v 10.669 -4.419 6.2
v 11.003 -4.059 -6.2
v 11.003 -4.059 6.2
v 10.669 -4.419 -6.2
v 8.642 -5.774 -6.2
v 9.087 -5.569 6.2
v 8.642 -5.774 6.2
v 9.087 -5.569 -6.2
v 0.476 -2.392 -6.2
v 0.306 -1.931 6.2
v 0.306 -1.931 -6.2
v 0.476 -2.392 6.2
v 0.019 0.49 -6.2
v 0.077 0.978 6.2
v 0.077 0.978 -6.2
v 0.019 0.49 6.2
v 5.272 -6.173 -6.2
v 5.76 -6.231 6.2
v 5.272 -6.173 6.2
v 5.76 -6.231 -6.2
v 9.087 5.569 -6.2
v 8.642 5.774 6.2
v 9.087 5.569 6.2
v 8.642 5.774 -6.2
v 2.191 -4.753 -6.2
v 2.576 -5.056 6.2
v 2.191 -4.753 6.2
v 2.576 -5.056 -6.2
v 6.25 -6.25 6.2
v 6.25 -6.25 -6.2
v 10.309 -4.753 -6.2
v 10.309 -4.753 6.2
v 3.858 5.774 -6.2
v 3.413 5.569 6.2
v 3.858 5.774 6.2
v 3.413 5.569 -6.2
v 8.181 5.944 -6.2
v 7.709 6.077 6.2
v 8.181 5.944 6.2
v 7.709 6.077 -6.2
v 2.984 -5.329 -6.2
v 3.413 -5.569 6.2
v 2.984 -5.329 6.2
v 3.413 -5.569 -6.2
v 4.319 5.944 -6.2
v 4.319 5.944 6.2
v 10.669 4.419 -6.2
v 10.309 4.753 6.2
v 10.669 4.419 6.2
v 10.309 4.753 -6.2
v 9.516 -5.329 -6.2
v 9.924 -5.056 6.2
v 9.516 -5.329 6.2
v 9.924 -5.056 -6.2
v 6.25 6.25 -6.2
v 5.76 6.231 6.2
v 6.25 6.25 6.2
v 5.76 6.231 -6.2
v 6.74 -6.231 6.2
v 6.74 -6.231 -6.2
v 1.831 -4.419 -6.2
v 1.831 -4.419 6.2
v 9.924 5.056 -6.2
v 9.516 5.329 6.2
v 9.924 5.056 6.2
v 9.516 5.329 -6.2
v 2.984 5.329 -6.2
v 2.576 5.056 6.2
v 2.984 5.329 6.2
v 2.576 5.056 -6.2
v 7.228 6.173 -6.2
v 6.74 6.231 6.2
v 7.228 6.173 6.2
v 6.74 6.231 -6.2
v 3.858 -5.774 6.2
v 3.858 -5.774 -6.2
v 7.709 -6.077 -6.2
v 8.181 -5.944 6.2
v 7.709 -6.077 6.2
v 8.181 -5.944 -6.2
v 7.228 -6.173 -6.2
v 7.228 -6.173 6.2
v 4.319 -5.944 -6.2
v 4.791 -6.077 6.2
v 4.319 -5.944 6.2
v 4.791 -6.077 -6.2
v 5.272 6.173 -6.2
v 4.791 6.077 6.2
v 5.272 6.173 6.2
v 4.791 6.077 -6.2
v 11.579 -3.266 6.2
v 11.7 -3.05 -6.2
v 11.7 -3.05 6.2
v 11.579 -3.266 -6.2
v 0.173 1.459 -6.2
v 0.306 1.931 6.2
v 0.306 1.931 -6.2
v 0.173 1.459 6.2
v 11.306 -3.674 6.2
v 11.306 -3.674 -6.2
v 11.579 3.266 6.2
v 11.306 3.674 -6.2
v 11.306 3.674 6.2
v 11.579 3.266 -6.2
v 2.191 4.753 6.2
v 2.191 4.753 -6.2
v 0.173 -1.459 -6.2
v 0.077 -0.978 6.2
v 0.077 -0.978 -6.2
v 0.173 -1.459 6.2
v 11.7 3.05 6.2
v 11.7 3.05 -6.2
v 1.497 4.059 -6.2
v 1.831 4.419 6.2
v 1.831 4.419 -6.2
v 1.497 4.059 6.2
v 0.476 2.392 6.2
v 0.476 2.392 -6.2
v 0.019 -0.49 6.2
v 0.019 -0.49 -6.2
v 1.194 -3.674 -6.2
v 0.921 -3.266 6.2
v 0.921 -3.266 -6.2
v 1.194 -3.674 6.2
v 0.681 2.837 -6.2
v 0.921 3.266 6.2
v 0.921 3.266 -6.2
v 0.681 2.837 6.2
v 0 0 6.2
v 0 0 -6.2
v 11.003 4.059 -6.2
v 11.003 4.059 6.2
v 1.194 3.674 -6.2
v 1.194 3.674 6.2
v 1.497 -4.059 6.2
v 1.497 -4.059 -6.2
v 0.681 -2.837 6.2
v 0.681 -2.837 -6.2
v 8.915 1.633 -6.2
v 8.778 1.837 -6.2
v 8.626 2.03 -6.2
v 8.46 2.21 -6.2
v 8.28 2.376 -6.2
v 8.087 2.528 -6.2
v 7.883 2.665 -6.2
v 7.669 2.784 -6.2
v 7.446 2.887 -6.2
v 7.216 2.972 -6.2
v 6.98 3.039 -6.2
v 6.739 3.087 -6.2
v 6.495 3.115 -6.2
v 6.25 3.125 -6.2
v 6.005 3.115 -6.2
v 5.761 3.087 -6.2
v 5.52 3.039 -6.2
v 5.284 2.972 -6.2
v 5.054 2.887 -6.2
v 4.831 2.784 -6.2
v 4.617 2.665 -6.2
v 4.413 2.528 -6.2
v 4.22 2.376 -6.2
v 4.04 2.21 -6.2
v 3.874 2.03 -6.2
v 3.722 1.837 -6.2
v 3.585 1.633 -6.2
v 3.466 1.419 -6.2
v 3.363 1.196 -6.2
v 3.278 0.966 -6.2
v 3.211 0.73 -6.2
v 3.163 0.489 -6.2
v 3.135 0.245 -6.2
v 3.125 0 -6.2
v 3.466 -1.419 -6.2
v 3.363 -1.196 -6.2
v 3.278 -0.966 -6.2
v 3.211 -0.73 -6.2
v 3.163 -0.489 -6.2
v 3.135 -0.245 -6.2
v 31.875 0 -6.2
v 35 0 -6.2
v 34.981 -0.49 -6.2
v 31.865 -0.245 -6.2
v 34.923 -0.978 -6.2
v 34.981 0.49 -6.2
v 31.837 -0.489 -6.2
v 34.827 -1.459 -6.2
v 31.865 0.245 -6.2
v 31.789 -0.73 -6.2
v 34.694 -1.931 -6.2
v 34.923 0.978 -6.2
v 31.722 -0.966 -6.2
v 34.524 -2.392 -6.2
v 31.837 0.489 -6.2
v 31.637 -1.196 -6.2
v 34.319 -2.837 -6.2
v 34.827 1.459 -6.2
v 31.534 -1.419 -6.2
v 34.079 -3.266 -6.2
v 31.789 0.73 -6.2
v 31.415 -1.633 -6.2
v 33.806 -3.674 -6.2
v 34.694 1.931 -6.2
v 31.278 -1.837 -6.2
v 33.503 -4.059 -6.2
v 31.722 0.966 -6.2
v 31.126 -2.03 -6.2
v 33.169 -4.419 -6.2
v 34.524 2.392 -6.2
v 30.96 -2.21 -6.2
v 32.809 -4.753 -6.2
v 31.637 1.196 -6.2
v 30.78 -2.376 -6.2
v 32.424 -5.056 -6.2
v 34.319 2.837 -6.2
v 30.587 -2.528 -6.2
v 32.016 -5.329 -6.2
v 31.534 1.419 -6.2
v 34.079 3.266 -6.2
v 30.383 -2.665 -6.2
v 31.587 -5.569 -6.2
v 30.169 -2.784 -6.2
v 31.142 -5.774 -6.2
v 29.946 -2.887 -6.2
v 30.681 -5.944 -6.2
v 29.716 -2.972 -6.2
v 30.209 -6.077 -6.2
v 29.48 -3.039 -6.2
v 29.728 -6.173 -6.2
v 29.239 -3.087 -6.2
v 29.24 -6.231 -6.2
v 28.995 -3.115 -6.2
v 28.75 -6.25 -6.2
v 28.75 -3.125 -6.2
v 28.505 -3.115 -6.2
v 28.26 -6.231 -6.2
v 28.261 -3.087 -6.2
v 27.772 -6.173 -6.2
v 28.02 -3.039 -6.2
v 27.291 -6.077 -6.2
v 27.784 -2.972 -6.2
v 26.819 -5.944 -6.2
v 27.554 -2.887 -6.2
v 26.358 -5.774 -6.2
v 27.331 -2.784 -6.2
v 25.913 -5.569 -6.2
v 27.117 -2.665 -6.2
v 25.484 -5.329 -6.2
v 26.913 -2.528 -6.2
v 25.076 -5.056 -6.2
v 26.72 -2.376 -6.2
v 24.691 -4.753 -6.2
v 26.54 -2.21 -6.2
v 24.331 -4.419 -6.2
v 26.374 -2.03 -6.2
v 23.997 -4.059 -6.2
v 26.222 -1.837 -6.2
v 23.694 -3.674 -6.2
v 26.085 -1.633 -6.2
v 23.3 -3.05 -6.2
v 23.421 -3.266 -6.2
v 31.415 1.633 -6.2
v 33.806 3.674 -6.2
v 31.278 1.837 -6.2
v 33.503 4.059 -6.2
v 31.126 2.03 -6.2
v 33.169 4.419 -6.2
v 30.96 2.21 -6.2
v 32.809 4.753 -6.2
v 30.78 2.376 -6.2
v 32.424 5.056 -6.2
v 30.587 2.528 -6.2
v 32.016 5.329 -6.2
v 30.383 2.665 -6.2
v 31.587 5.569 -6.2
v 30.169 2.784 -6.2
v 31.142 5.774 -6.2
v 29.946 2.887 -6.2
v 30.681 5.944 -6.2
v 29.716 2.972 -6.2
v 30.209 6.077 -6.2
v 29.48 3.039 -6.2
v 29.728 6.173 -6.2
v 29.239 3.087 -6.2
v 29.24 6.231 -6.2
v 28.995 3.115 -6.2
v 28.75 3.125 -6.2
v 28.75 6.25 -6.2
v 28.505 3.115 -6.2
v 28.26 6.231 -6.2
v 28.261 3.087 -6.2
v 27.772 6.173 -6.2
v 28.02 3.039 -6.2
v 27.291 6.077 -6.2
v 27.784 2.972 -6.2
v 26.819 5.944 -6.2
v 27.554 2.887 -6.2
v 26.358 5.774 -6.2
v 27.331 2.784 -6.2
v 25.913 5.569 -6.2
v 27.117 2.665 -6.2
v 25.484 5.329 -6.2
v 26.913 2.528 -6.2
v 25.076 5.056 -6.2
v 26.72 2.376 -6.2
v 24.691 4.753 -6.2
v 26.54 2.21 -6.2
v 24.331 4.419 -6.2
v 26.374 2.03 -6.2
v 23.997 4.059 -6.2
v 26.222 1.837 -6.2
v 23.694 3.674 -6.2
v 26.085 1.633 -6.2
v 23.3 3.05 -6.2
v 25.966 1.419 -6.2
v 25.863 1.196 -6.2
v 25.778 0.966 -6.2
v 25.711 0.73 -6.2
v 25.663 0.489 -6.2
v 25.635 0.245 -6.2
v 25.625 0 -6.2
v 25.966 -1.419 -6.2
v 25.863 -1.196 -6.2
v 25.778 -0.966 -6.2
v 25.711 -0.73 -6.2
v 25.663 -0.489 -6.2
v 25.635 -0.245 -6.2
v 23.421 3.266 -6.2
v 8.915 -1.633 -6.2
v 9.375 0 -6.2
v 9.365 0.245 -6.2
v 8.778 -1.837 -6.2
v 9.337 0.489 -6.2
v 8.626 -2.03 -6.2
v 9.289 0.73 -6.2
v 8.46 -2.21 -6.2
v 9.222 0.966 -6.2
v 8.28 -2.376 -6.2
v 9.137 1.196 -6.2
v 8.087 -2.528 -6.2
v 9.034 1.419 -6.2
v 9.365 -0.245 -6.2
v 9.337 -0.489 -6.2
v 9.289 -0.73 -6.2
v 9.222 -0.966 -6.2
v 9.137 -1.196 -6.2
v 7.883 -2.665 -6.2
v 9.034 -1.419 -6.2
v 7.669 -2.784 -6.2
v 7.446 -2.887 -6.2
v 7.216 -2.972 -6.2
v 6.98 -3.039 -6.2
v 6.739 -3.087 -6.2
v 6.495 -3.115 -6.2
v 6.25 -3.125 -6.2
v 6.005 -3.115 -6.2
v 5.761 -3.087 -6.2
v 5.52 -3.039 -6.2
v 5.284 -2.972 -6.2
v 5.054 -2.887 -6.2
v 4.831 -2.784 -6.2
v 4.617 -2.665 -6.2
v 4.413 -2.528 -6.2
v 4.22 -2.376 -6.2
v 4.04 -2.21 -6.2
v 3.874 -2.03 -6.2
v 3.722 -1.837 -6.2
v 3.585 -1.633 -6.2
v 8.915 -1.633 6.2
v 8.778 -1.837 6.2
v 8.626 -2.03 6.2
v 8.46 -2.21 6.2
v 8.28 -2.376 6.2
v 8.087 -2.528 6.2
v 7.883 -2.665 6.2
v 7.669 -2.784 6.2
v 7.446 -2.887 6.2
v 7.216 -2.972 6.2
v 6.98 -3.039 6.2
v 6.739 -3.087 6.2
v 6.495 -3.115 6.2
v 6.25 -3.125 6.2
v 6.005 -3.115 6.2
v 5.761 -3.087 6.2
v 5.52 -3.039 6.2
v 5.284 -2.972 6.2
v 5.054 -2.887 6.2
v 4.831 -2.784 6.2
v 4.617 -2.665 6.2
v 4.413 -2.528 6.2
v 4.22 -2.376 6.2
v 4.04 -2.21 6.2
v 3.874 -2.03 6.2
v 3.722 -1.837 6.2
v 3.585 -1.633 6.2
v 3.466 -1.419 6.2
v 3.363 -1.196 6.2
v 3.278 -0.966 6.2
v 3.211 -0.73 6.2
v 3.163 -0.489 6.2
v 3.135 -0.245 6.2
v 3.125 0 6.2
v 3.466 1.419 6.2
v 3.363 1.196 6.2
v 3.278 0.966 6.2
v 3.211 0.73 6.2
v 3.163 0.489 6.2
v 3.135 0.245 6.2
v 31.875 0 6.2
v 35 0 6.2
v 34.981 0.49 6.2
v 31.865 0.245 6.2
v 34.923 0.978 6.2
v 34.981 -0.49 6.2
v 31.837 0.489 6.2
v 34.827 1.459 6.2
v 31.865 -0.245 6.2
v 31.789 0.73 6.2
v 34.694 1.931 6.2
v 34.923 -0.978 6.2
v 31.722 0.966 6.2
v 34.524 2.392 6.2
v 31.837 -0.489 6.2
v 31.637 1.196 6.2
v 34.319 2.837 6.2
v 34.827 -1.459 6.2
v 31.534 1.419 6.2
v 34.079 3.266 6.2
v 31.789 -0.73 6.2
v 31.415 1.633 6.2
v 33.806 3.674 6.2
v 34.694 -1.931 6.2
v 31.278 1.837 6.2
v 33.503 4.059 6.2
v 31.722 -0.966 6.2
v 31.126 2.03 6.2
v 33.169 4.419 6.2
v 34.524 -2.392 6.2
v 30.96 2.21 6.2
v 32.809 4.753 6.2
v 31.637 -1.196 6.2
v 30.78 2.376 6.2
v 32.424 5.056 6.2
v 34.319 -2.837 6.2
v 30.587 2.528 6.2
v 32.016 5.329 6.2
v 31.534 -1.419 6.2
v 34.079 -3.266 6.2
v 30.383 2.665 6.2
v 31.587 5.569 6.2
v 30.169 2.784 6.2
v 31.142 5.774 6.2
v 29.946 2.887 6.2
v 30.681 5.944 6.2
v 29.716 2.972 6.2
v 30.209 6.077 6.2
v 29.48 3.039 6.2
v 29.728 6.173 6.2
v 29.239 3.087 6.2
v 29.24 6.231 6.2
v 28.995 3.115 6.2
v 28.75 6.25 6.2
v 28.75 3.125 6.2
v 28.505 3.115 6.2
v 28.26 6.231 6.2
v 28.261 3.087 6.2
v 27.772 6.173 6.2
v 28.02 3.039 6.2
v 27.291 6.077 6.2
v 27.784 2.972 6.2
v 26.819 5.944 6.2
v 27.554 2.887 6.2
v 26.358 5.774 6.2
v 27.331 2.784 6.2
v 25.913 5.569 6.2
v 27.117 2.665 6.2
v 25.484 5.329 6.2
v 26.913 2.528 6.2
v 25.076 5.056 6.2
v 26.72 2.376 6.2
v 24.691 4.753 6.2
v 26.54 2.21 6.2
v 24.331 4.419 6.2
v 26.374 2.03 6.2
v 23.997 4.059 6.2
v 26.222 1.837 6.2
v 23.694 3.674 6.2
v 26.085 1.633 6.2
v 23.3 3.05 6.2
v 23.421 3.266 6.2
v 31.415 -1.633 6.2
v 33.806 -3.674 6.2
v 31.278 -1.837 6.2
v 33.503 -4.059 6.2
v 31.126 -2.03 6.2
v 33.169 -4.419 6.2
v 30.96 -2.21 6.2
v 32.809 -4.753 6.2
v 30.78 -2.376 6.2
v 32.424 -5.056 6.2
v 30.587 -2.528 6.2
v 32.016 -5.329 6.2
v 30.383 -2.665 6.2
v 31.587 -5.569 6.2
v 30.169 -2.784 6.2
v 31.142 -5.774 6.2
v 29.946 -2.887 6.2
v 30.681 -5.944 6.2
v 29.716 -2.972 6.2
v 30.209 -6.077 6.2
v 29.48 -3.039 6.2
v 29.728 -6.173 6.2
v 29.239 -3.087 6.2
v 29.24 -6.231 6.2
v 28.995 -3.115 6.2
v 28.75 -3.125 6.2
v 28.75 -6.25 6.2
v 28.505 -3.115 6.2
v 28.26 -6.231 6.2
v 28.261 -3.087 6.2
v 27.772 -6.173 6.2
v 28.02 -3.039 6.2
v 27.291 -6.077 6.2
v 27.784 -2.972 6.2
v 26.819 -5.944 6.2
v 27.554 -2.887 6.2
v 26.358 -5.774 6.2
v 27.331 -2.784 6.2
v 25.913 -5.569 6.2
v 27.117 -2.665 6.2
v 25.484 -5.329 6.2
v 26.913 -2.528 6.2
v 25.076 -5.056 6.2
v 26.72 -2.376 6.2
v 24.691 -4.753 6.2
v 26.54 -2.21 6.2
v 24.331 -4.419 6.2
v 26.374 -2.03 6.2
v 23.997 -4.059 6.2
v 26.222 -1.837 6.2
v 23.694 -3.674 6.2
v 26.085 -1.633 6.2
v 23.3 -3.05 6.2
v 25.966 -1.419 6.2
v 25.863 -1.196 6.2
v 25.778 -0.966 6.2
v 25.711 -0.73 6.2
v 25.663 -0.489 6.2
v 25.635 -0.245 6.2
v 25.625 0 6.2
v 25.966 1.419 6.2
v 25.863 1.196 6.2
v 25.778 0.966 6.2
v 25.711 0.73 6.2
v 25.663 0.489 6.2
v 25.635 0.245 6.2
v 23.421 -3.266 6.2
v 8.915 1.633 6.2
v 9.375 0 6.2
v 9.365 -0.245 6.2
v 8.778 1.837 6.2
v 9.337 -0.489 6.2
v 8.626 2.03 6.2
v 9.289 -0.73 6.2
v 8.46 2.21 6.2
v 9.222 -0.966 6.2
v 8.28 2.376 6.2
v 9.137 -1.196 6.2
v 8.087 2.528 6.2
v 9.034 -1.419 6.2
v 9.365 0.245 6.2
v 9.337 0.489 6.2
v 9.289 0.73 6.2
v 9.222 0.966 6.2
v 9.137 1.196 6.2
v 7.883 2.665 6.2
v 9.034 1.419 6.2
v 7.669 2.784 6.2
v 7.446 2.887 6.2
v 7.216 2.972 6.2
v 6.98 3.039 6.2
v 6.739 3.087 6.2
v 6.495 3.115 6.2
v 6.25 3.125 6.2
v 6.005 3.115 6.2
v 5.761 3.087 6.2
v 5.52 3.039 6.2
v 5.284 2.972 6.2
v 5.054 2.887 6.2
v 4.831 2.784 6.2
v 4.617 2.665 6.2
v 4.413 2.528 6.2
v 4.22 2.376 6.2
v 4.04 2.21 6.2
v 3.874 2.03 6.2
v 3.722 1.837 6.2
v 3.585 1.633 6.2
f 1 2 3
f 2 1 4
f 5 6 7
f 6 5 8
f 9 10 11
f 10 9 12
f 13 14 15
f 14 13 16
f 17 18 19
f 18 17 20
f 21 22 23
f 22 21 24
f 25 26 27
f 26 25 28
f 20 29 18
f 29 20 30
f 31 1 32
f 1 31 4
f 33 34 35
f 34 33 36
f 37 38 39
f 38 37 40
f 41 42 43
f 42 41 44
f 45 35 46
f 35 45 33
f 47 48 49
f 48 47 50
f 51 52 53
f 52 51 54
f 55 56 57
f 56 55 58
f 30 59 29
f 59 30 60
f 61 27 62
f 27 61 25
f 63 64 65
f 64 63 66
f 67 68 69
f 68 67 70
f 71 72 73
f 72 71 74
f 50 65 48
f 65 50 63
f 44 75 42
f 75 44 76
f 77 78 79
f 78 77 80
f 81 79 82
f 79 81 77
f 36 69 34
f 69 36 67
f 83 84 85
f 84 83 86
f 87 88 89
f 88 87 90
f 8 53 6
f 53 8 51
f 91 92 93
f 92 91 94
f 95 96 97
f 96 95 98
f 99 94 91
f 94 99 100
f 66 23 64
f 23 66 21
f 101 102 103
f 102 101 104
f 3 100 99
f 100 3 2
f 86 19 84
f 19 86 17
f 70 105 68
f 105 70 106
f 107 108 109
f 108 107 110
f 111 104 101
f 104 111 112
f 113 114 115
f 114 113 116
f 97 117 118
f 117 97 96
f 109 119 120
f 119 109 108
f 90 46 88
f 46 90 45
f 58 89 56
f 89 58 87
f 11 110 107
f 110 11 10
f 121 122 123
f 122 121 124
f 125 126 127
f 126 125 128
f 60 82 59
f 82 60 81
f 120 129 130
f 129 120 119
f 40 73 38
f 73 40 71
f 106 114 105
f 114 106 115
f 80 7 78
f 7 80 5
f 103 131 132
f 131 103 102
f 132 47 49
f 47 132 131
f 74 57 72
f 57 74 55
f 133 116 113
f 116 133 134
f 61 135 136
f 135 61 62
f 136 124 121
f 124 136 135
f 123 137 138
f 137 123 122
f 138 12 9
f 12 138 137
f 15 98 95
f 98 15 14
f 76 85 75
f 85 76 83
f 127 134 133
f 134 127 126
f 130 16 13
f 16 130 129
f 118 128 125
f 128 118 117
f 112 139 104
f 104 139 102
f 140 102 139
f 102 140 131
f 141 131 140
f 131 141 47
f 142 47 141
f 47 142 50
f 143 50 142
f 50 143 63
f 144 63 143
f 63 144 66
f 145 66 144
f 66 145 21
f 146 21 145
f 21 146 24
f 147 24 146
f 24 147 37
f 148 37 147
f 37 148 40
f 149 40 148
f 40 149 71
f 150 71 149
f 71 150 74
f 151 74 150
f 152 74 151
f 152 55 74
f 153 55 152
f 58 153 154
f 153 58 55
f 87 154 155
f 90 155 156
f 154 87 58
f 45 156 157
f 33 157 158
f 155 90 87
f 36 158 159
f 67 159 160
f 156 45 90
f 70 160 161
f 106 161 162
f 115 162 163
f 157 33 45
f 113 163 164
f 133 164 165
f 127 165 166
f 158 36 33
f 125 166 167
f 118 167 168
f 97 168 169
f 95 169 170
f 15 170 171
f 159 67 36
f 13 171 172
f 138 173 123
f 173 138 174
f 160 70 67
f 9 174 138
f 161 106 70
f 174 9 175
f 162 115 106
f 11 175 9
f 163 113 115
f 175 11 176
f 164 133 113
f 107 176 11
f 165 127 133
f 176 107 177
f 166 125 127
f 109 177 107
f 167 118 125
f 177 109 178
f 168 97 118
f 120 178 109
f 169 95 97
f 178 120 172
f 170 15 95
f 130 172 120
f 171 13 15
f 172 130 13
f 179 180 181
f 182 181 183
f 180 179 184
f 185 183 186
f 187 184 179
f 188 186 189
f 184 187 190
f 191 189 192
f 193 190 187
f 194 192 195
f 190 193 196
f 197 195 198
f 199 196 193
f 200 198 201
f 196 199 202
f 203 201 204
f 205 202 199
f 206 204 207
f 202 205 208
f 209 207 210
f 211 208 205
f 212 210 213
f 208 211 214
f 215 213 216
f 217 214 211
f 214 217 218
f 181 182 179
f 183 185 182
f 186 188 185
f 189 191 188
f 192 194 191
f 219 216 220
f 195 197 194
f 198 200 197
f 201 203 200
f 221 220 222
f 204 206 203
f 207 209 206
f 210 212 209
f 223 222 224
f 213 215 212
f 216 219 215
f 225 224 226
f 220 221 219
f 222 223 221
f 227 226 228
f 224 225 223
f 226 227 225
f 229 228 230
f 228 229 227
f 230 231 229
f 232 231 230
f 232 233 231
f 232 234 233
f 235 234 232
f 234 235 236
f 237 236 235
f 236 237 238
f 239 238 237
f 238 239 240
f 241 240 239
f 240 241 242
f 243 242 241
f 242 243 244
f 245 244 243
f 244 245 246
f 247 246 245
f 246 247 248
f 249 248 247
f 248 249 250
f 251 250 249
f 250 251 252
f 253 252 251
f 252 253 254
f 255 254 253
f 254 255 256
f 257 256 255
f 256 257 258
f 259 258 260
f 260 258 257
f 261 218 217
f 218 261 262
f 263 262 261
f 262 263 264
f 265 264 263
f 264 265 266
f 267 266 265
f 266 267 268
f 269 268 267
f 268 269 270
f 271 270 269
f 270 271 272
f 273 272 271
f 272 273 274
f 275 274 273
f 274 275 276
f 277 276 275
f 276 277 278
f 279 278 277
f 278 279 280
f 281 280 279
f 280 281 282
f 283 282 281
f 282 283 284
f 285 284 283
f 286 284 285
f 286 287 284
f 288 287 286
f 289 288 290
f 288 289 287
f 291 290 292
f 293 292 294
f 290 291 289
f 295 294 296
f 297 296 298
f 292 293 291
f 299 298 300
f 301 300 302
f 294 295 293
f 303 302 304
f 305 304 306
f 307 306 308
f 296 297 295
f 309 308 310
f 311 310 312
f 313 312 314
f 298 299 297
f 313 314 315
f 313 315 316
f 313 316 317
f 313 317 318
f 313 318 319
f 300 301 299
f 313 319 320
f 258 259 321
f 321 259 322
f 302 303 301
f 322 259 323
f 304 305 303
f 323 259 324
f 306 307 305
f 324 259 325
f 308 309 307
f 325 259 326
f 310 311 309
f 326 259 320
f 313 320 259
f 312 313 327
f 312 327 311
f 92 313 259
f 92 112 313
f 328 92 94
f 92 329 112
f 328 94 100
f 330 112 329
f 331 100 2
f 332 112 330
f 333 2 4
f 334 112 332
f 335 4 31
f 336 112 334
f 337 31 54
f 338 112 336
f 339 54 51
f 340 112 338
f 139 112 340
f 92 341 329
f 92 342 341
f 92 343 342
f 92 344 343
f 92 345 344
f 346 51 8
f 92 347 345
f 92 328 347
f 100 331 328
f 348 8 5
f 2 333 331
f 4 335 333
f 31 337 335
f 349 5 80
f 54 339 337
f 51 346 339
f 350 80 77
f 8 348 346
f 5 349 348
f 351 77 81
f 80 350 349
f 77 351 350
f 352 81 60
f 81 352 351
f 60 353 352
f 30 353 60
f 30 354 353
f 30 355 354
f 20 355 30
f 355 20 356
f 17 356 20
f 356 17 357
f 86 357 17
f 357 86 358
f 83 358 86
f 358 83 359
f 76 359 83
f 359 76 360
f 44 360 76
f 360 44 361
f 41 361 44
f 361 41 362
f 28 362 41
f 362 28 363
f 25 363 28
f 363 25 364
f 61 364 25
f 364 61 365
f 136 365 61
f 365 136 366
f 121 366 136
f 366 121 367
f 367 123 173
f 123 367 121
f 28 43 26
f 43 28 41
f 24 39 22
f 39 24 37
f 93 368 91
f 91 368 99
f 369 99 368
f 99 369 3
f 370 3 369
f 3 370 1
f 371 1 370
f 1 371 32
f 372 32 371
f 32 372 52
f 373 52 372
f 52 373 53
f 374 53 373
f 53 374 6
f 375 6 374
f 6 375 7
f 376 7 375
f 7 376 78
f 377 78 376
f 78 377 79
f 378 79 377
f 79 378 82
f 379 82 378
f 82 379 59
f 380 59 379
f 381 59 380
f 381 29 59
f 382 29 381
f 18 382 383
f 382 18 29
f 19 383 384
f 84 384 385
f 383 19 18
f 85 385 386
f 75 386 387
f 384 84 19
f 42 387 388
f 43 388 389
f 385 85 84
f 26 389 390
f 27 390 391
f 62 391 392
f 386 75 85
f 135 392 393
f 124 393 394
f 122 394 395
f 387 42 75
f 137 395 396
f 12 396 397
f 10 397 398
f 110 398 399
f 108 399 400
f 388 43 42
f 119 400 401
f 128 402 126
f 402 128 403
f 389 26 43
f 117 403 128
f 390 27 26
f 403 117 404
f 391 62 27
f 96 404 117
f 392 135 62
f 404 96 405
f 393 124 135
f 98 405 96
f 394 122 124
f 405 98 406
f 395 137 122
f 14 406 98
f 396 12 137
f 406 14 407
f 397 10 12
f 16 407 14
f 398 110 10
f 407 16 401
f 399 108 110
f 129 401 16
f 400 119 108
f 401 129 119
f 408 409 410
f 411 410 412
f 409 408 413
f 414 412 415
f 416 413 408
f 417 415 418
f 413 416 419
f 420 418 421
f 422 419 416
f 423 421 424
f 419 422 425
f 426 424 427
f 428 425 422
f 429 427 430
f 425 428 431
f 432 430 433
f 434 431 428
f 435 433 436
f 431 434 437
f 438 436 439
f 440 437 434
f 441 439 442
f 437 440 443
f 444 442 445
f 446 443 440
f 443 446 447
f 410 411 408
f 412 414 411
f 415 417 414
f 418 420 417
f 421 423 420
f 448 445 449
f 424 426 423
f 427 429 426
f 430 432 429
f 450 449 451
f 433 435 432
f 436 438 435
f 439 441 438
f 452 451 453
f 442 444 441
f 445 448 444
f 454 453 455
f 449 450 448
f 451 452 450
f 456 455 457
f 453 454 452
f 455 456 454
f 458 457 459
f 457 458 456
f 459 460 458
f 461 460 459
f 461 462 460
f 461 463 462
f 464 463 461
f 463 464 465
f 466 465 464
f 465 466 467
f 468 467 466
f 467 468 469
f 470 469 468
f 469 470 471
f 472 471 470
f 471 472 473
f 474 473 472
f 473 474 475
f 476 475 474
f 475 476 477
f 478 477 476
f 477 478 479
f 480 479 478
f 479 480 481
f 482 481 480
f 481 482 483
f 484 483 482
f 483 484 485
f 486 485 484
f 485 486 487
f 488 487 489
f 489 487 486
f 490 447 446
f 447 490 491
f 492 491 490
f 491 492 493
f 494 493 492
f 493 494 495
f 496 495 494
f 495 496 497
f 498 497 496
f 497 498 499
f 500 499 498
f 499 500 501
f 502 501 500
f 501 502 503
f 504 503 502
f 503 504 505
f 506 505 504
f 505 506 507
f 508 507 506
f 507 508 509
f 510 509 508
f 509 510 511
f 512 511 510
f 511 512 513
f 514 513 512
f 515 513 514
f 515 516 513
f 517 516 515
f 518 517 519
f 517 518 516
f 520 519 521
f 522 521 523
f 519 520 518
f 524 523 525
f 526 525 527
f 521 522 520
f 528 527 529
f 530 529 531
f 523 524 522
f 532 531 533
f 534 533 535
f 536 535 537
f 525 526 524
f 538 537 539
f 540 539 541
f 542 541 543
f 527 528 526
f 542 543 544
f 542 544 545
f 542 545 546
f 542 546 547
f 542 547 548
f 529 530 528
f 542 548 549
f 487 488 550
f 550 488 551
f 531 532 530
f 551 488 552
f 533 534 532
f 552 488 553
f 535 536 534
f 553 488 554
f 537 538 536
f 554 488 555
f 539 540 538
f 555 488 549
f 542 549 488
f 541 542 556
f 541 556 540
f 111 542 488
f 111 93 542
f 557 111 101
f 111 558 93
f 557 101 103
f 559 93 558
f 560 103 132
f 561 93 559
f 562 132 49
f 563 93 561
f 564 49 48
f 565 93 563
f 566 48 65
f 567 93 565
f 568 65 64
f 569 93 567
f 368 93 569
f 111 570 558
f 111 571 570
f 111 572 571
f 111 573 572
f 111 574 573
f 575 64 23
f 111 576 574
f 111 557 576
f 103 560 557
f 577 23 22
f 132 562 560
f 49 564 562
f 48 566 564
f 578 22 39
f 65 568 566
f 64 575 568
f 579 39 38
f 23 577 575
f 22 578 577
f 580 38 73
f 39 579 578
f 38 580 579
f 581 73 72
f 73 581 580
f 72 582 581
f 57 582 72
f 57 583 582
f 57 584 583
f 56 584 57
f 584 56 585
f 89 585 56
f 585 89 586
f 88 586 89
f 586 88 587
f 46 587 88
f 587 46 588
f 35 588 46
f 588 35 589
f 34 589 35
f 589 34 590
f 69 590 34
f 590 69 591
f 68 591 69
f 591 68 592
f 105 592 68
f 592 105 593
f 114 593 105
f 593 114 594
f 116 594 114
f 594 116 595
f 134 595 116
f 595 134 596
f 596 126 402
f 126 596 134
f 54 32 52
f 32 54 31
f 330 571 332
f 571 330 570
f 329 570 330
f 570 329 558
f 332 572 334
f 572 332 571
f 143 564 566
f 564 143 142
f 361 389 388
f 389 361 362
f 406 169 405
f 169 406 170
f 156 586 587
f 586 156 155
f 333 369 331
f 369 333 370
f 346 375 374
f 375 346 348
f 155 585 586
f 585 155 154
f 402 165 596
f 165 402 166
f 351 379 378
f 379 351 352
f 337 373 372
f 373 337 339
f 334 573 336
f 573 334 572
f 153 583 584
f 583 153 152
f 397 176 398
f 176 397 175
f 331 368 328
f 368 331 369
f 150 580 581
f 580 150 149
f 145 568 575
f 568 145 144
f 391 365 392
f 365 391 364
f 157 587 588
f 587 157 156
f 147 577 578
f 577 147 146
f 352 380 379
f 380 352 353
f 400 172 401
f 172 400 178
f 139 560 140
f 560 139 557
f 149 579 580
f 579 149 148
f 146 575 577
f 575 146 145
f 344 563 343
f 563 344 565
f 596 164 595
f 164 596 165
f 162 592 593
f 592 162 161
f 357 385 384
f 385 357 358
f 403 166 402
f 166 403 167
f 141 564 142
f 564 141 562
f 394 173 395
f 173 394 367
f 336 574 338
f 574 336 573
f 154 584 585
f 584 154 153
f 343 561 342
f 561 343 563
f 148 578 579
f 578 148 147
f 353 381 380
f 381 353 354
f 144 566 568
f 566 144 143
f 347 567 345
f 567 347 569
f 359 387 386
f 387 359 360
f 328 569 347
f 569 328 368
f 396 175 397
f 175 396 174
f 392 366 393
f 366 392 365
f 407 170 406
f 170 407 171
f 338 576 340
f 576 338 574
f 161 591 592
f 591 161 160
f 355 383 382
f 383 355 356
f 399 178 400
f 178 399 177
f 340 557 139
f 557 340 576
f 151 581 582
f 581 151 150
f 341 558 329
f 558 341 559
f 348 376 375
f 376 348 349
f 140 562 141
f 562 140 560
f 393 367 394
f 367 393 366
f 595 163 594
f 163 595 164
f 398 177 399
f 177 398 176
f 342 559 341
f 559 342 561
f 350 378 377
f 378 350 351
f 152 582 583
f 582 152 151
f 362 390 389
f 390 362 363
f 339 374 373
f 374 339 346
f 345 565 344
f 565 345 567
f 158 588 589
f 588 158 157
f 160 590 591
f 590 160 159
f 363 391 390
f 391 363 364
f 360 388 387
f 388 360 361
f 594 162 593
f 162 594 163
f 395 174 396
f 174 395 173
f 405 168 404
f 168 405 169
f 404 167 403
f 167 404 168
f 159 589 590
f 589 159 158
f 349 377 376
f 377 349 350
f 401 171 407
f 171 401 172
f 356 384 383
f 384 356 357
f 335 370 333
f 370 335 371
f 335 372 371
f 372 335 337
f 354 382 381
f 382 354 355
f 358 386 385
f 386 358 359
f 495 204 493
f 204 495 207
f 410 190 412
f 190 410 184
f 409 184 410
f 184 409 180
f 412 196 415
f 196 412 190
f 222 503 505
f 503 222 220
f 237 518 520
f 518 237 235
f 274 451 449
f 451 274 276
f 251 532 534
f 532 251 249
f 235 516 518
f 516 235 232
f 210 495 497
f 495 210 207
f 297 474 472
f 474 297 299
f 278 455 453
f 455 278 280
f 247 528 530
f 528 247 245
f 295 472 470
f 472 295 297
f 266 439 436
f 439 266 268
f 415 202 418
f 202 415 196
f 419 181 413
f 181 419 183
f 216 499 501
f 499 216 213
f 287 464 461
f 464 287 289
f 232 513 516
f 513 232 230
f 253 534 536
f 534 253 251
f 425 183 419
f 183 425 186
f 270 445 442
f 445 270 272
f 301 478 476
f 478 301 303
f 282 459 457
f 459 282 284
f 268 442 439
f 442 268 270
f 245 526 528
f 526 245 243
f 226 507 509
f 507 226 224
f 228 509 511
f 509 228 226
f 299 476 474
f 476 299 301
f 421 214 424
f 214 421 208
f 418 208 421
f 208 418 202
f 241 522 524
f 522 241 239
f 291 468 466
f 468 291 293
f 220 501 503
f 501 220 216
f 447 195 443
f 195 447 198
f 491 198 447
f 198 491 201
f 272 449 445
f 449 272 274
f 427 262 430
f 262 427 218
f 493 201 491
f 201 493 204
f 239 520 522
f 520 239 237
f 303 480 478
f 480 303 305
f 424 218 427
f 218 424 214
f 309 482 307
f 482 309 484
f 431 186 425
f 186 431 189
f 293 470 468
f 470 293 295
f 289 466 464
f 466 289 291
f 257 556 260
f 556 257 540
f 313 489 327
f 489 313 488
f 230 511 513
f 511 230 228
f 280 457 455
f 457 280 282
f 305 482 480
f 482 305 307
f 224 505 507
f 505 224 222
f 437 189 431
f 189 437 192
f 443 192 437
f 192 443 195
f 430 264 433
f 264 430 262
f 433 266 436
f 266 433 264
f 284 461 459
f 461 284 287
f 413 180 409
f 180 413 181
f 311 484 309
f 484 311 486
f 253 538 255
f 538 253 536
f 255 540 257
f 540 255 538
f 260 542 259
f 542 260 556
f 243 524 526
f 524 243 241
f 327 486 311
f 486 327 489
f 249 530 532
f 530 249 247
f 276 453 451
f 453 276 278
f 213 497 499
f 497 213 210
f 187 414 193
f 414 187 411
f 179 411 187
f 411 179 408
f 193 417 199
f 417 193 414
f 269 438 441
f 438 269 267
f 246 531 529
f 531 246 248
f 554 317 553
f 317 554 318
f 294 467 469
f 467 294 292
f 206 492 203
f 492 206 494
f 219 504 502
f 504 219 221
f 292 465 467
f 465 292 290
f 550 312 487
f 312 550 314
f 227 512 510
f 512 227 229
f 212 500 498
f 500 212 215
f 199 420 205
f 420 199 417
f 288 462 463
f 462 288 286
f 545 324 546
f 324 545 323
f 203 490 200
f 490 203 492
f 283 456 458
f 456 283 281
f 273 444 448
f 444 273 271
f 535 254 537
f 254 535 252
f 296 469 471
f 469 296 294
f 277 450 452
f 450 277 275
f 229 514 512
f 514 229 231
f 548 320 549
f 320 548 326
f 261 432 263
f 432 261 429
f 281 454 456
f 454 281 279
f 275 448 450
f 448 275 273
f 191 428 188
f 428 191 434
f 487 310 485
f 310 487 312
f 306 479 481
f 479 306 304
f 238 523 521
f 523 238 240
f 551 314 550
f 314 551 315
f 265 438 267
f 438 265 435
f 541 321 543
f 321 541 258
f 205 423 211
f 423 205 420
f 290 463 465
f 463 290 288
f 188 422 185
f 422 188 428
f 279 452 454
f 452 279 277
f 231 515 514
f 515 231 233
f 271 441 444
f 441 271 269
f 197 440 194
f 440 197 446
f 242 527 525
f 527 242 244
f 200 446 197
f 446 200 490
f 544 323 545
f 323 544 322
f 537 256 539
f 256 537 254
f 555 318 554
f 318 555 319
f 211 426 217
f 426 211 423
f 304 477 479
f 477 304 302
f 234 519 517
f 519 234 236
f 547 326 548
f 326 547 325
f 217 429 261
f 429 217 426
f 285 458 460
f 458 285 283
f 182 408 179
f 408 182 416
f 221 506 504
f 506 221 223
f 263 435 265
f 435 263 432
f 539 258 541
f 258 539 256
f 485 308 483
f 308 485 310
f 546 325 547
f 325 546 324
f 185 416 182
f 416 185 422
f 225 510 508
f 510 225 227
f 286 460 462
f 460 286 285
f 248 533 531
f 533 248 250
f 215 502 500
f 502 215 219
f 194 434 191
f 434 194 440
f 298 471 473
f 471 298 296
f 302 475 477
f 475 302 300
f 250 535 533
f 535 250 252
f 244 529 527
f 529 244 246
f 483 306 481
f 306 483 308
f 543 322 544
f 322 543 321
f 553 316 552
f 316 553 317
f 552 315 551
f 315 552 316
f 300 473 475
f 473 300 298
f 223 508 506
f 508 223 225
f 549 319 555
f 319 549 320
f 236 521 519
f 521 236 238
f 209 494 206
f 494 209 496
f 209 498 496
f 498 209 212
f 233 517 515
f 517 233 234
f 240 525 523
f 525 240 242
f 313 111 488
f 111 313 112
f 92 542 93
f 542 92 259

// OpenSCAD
$fn=80;

length = 35;
dia = 12.5;
inner_dia=dia/2;
strength = 6.1;
height = 12.4;

module tube(h,r,inner_r,center) {
	difference() {
		cylinder(h=h, r=r, center=center);
		translate([0,0,-0.1]) cylinder(h=h+0.3, r=inner_r, center=center);
	}
}

translate([dia/2,0,0]) tube(h=height,r=dia/2,,inner_r=inner_dia/2,center=true);
translate([length-dia/2,0,0]) tube(h=height,r=dia/2,inner_r=inner_dia/2,center=true);

translate([dia/2+inner_dia/2,-strength/2,-height/2]) cube([length-(dia+inner_dia),strength,height]);
